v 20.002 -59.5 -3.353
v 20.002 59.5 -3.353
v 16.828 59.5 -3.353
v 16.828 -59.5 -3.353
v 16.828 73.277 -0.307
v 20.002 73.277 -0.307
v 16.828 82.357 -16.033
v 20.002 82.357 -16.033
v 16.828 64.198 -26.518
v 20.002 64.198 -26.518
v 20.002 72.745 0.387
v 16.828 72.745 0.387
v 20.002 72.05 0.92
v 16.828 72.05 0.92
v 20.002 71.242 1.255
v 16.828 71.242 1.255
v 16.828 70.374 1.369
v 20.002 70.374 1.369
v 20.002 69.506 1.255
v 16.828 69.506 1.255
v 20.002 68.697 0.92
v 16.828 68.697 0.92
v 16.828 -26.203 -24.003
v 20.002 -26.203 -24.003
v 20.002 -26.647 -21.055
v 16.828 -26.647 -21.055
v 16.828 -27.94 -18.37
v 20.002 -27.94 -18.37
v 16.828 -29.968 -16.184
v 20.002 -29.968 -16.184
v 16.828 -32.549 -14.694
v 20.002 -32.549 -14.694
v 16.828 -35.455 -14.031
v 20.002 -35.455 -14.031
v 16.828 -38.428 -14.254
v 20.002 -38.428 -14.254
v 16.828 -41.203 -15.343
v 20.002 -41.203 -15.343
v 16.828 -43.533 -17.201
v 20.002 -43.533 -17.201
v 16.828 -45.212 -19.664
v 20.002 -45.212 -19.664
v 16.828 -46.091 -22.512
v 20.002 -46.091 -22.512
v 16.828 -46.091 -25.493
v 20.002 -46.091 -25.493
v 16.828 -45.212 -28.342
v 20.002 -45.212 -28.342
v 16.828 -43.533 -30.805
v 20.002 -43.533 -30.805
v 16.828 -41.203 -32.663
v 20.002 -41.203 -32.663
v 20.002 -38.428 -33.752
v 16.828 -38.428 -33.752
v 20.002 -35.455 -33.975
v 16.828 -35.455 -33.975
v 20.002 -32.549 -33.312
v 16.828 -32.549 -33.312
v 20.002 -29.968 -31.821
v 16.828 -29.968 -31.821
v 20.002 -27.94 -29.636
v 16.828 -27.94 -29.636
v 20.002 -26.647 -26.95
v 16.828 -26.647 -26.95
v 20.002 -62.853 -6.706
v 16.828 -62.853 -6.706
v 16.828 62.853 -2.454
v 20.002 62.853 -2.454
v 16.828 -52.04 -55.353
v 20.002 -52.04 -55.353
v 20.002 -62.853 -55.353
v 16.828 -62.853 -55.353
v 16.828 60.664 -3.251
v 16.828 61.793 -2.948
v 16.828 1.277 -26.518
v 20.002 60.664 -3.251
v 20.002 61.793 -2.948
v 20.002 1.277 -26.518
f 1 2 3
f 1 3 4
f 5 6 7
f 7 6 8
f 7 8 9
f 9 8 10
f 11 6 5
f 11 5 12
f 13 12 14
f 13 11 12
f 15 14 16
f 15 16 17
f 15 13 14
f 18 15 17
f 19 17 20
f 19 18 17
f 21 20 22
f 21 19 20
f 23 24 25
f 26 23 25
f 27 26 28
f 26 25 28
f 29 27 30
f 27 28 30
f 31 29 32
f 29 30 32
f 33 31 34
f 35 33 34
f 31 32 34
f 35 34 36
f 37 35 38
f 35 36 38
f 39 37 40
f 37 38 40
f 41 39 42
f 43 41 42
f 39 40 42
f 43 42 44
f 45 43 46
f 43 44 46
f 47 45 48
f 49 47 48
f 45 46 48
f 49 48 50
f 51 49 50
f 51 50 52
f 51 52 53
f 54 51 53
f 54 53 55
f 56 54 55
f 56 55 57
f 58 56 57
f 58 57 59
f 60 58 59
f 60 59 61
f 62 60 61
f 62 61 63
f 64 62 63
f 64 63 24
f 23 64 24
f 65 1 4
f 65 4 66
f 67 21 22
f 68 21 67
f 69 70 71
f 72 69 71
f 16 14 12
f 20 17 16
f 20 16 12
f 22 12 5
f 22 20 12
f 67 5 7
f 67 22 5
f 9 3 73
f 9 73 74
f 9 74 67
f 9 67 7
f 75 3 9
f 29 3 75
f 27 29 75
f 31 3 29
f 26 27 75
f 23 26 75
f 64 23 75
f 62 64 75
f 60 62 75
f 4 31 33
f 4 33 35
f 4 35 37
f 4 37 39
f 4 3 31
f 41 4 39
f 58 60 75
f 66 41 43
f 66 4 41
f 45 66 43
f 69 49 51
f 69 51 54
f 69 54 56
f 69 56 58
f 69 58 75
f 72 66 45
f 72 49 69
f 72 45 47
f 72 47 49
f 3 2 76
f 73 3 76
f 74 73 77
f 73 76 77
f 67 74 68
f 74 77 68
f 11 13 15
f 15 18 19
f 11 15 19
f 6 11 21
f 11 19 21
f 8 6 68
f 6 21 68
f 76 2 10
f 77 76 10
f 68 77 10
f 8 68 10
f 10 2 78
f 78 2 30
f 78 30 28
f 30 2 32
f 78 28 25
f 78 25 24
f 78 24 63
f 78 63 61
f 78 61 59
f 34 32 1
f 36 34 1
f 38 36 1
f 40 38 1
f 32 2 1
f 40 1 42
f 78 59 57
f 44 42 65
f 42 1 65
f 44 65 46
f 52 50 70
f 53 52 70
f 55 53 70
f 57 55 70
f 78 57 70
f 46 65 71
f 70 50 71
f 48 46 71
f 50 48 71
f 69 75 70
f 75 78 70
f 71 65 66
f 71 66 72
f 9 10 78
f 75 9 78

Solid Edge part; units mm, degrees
sketch "Sketch1" plane through (20.0025, 0, 0) normal (1, 0, 0) x (0, 1, 0)
  line L0 (82.357, -16.0334) -> (64.1977, -26.5176)
  line L1 (64.1977, -26.5176) -> (1.2767, -26.5176)
  line L2 (1.2767, -26.5176) -> (-52.04, -55.3528)
  line L3 (-52.04, -55.3528) -> (-62.8528, -55.3528)
  line L4 (-62.8528, -6.7056) -> (-62.8528, -55.3528)
  line L5 (-59.5, -3.3528) -> (-62.8528, -6.7056)
  line L6 (59.5, -3.3528) -> (-59.5, -3.3528)
  arc A0 (59.5, -3.3528) -> (62.8528, -2.4544) centre (59.5, 3.3528) ccw
  line L7 (68.6974, 0.92) -> (62.8528, -2.4544)
  arc A1 (73.2775, -0.3072) -> (68.6974, 0.92) centre (70.3738, -1.9836) ccw
  line L8 (73.2775, -0.3072) -> (82.357, -16.0334)
  circle A2 centre (-36.2028, -24.0028) radius 10
  dimension "D1" = 23.1648
  dimension "D2" = 20.65
  dimension "D3" = 26.65
extrude "ExtrudedProtrusion_1" add sketch "Sketch1" against normal blind 3.175
properties material "Steel"
